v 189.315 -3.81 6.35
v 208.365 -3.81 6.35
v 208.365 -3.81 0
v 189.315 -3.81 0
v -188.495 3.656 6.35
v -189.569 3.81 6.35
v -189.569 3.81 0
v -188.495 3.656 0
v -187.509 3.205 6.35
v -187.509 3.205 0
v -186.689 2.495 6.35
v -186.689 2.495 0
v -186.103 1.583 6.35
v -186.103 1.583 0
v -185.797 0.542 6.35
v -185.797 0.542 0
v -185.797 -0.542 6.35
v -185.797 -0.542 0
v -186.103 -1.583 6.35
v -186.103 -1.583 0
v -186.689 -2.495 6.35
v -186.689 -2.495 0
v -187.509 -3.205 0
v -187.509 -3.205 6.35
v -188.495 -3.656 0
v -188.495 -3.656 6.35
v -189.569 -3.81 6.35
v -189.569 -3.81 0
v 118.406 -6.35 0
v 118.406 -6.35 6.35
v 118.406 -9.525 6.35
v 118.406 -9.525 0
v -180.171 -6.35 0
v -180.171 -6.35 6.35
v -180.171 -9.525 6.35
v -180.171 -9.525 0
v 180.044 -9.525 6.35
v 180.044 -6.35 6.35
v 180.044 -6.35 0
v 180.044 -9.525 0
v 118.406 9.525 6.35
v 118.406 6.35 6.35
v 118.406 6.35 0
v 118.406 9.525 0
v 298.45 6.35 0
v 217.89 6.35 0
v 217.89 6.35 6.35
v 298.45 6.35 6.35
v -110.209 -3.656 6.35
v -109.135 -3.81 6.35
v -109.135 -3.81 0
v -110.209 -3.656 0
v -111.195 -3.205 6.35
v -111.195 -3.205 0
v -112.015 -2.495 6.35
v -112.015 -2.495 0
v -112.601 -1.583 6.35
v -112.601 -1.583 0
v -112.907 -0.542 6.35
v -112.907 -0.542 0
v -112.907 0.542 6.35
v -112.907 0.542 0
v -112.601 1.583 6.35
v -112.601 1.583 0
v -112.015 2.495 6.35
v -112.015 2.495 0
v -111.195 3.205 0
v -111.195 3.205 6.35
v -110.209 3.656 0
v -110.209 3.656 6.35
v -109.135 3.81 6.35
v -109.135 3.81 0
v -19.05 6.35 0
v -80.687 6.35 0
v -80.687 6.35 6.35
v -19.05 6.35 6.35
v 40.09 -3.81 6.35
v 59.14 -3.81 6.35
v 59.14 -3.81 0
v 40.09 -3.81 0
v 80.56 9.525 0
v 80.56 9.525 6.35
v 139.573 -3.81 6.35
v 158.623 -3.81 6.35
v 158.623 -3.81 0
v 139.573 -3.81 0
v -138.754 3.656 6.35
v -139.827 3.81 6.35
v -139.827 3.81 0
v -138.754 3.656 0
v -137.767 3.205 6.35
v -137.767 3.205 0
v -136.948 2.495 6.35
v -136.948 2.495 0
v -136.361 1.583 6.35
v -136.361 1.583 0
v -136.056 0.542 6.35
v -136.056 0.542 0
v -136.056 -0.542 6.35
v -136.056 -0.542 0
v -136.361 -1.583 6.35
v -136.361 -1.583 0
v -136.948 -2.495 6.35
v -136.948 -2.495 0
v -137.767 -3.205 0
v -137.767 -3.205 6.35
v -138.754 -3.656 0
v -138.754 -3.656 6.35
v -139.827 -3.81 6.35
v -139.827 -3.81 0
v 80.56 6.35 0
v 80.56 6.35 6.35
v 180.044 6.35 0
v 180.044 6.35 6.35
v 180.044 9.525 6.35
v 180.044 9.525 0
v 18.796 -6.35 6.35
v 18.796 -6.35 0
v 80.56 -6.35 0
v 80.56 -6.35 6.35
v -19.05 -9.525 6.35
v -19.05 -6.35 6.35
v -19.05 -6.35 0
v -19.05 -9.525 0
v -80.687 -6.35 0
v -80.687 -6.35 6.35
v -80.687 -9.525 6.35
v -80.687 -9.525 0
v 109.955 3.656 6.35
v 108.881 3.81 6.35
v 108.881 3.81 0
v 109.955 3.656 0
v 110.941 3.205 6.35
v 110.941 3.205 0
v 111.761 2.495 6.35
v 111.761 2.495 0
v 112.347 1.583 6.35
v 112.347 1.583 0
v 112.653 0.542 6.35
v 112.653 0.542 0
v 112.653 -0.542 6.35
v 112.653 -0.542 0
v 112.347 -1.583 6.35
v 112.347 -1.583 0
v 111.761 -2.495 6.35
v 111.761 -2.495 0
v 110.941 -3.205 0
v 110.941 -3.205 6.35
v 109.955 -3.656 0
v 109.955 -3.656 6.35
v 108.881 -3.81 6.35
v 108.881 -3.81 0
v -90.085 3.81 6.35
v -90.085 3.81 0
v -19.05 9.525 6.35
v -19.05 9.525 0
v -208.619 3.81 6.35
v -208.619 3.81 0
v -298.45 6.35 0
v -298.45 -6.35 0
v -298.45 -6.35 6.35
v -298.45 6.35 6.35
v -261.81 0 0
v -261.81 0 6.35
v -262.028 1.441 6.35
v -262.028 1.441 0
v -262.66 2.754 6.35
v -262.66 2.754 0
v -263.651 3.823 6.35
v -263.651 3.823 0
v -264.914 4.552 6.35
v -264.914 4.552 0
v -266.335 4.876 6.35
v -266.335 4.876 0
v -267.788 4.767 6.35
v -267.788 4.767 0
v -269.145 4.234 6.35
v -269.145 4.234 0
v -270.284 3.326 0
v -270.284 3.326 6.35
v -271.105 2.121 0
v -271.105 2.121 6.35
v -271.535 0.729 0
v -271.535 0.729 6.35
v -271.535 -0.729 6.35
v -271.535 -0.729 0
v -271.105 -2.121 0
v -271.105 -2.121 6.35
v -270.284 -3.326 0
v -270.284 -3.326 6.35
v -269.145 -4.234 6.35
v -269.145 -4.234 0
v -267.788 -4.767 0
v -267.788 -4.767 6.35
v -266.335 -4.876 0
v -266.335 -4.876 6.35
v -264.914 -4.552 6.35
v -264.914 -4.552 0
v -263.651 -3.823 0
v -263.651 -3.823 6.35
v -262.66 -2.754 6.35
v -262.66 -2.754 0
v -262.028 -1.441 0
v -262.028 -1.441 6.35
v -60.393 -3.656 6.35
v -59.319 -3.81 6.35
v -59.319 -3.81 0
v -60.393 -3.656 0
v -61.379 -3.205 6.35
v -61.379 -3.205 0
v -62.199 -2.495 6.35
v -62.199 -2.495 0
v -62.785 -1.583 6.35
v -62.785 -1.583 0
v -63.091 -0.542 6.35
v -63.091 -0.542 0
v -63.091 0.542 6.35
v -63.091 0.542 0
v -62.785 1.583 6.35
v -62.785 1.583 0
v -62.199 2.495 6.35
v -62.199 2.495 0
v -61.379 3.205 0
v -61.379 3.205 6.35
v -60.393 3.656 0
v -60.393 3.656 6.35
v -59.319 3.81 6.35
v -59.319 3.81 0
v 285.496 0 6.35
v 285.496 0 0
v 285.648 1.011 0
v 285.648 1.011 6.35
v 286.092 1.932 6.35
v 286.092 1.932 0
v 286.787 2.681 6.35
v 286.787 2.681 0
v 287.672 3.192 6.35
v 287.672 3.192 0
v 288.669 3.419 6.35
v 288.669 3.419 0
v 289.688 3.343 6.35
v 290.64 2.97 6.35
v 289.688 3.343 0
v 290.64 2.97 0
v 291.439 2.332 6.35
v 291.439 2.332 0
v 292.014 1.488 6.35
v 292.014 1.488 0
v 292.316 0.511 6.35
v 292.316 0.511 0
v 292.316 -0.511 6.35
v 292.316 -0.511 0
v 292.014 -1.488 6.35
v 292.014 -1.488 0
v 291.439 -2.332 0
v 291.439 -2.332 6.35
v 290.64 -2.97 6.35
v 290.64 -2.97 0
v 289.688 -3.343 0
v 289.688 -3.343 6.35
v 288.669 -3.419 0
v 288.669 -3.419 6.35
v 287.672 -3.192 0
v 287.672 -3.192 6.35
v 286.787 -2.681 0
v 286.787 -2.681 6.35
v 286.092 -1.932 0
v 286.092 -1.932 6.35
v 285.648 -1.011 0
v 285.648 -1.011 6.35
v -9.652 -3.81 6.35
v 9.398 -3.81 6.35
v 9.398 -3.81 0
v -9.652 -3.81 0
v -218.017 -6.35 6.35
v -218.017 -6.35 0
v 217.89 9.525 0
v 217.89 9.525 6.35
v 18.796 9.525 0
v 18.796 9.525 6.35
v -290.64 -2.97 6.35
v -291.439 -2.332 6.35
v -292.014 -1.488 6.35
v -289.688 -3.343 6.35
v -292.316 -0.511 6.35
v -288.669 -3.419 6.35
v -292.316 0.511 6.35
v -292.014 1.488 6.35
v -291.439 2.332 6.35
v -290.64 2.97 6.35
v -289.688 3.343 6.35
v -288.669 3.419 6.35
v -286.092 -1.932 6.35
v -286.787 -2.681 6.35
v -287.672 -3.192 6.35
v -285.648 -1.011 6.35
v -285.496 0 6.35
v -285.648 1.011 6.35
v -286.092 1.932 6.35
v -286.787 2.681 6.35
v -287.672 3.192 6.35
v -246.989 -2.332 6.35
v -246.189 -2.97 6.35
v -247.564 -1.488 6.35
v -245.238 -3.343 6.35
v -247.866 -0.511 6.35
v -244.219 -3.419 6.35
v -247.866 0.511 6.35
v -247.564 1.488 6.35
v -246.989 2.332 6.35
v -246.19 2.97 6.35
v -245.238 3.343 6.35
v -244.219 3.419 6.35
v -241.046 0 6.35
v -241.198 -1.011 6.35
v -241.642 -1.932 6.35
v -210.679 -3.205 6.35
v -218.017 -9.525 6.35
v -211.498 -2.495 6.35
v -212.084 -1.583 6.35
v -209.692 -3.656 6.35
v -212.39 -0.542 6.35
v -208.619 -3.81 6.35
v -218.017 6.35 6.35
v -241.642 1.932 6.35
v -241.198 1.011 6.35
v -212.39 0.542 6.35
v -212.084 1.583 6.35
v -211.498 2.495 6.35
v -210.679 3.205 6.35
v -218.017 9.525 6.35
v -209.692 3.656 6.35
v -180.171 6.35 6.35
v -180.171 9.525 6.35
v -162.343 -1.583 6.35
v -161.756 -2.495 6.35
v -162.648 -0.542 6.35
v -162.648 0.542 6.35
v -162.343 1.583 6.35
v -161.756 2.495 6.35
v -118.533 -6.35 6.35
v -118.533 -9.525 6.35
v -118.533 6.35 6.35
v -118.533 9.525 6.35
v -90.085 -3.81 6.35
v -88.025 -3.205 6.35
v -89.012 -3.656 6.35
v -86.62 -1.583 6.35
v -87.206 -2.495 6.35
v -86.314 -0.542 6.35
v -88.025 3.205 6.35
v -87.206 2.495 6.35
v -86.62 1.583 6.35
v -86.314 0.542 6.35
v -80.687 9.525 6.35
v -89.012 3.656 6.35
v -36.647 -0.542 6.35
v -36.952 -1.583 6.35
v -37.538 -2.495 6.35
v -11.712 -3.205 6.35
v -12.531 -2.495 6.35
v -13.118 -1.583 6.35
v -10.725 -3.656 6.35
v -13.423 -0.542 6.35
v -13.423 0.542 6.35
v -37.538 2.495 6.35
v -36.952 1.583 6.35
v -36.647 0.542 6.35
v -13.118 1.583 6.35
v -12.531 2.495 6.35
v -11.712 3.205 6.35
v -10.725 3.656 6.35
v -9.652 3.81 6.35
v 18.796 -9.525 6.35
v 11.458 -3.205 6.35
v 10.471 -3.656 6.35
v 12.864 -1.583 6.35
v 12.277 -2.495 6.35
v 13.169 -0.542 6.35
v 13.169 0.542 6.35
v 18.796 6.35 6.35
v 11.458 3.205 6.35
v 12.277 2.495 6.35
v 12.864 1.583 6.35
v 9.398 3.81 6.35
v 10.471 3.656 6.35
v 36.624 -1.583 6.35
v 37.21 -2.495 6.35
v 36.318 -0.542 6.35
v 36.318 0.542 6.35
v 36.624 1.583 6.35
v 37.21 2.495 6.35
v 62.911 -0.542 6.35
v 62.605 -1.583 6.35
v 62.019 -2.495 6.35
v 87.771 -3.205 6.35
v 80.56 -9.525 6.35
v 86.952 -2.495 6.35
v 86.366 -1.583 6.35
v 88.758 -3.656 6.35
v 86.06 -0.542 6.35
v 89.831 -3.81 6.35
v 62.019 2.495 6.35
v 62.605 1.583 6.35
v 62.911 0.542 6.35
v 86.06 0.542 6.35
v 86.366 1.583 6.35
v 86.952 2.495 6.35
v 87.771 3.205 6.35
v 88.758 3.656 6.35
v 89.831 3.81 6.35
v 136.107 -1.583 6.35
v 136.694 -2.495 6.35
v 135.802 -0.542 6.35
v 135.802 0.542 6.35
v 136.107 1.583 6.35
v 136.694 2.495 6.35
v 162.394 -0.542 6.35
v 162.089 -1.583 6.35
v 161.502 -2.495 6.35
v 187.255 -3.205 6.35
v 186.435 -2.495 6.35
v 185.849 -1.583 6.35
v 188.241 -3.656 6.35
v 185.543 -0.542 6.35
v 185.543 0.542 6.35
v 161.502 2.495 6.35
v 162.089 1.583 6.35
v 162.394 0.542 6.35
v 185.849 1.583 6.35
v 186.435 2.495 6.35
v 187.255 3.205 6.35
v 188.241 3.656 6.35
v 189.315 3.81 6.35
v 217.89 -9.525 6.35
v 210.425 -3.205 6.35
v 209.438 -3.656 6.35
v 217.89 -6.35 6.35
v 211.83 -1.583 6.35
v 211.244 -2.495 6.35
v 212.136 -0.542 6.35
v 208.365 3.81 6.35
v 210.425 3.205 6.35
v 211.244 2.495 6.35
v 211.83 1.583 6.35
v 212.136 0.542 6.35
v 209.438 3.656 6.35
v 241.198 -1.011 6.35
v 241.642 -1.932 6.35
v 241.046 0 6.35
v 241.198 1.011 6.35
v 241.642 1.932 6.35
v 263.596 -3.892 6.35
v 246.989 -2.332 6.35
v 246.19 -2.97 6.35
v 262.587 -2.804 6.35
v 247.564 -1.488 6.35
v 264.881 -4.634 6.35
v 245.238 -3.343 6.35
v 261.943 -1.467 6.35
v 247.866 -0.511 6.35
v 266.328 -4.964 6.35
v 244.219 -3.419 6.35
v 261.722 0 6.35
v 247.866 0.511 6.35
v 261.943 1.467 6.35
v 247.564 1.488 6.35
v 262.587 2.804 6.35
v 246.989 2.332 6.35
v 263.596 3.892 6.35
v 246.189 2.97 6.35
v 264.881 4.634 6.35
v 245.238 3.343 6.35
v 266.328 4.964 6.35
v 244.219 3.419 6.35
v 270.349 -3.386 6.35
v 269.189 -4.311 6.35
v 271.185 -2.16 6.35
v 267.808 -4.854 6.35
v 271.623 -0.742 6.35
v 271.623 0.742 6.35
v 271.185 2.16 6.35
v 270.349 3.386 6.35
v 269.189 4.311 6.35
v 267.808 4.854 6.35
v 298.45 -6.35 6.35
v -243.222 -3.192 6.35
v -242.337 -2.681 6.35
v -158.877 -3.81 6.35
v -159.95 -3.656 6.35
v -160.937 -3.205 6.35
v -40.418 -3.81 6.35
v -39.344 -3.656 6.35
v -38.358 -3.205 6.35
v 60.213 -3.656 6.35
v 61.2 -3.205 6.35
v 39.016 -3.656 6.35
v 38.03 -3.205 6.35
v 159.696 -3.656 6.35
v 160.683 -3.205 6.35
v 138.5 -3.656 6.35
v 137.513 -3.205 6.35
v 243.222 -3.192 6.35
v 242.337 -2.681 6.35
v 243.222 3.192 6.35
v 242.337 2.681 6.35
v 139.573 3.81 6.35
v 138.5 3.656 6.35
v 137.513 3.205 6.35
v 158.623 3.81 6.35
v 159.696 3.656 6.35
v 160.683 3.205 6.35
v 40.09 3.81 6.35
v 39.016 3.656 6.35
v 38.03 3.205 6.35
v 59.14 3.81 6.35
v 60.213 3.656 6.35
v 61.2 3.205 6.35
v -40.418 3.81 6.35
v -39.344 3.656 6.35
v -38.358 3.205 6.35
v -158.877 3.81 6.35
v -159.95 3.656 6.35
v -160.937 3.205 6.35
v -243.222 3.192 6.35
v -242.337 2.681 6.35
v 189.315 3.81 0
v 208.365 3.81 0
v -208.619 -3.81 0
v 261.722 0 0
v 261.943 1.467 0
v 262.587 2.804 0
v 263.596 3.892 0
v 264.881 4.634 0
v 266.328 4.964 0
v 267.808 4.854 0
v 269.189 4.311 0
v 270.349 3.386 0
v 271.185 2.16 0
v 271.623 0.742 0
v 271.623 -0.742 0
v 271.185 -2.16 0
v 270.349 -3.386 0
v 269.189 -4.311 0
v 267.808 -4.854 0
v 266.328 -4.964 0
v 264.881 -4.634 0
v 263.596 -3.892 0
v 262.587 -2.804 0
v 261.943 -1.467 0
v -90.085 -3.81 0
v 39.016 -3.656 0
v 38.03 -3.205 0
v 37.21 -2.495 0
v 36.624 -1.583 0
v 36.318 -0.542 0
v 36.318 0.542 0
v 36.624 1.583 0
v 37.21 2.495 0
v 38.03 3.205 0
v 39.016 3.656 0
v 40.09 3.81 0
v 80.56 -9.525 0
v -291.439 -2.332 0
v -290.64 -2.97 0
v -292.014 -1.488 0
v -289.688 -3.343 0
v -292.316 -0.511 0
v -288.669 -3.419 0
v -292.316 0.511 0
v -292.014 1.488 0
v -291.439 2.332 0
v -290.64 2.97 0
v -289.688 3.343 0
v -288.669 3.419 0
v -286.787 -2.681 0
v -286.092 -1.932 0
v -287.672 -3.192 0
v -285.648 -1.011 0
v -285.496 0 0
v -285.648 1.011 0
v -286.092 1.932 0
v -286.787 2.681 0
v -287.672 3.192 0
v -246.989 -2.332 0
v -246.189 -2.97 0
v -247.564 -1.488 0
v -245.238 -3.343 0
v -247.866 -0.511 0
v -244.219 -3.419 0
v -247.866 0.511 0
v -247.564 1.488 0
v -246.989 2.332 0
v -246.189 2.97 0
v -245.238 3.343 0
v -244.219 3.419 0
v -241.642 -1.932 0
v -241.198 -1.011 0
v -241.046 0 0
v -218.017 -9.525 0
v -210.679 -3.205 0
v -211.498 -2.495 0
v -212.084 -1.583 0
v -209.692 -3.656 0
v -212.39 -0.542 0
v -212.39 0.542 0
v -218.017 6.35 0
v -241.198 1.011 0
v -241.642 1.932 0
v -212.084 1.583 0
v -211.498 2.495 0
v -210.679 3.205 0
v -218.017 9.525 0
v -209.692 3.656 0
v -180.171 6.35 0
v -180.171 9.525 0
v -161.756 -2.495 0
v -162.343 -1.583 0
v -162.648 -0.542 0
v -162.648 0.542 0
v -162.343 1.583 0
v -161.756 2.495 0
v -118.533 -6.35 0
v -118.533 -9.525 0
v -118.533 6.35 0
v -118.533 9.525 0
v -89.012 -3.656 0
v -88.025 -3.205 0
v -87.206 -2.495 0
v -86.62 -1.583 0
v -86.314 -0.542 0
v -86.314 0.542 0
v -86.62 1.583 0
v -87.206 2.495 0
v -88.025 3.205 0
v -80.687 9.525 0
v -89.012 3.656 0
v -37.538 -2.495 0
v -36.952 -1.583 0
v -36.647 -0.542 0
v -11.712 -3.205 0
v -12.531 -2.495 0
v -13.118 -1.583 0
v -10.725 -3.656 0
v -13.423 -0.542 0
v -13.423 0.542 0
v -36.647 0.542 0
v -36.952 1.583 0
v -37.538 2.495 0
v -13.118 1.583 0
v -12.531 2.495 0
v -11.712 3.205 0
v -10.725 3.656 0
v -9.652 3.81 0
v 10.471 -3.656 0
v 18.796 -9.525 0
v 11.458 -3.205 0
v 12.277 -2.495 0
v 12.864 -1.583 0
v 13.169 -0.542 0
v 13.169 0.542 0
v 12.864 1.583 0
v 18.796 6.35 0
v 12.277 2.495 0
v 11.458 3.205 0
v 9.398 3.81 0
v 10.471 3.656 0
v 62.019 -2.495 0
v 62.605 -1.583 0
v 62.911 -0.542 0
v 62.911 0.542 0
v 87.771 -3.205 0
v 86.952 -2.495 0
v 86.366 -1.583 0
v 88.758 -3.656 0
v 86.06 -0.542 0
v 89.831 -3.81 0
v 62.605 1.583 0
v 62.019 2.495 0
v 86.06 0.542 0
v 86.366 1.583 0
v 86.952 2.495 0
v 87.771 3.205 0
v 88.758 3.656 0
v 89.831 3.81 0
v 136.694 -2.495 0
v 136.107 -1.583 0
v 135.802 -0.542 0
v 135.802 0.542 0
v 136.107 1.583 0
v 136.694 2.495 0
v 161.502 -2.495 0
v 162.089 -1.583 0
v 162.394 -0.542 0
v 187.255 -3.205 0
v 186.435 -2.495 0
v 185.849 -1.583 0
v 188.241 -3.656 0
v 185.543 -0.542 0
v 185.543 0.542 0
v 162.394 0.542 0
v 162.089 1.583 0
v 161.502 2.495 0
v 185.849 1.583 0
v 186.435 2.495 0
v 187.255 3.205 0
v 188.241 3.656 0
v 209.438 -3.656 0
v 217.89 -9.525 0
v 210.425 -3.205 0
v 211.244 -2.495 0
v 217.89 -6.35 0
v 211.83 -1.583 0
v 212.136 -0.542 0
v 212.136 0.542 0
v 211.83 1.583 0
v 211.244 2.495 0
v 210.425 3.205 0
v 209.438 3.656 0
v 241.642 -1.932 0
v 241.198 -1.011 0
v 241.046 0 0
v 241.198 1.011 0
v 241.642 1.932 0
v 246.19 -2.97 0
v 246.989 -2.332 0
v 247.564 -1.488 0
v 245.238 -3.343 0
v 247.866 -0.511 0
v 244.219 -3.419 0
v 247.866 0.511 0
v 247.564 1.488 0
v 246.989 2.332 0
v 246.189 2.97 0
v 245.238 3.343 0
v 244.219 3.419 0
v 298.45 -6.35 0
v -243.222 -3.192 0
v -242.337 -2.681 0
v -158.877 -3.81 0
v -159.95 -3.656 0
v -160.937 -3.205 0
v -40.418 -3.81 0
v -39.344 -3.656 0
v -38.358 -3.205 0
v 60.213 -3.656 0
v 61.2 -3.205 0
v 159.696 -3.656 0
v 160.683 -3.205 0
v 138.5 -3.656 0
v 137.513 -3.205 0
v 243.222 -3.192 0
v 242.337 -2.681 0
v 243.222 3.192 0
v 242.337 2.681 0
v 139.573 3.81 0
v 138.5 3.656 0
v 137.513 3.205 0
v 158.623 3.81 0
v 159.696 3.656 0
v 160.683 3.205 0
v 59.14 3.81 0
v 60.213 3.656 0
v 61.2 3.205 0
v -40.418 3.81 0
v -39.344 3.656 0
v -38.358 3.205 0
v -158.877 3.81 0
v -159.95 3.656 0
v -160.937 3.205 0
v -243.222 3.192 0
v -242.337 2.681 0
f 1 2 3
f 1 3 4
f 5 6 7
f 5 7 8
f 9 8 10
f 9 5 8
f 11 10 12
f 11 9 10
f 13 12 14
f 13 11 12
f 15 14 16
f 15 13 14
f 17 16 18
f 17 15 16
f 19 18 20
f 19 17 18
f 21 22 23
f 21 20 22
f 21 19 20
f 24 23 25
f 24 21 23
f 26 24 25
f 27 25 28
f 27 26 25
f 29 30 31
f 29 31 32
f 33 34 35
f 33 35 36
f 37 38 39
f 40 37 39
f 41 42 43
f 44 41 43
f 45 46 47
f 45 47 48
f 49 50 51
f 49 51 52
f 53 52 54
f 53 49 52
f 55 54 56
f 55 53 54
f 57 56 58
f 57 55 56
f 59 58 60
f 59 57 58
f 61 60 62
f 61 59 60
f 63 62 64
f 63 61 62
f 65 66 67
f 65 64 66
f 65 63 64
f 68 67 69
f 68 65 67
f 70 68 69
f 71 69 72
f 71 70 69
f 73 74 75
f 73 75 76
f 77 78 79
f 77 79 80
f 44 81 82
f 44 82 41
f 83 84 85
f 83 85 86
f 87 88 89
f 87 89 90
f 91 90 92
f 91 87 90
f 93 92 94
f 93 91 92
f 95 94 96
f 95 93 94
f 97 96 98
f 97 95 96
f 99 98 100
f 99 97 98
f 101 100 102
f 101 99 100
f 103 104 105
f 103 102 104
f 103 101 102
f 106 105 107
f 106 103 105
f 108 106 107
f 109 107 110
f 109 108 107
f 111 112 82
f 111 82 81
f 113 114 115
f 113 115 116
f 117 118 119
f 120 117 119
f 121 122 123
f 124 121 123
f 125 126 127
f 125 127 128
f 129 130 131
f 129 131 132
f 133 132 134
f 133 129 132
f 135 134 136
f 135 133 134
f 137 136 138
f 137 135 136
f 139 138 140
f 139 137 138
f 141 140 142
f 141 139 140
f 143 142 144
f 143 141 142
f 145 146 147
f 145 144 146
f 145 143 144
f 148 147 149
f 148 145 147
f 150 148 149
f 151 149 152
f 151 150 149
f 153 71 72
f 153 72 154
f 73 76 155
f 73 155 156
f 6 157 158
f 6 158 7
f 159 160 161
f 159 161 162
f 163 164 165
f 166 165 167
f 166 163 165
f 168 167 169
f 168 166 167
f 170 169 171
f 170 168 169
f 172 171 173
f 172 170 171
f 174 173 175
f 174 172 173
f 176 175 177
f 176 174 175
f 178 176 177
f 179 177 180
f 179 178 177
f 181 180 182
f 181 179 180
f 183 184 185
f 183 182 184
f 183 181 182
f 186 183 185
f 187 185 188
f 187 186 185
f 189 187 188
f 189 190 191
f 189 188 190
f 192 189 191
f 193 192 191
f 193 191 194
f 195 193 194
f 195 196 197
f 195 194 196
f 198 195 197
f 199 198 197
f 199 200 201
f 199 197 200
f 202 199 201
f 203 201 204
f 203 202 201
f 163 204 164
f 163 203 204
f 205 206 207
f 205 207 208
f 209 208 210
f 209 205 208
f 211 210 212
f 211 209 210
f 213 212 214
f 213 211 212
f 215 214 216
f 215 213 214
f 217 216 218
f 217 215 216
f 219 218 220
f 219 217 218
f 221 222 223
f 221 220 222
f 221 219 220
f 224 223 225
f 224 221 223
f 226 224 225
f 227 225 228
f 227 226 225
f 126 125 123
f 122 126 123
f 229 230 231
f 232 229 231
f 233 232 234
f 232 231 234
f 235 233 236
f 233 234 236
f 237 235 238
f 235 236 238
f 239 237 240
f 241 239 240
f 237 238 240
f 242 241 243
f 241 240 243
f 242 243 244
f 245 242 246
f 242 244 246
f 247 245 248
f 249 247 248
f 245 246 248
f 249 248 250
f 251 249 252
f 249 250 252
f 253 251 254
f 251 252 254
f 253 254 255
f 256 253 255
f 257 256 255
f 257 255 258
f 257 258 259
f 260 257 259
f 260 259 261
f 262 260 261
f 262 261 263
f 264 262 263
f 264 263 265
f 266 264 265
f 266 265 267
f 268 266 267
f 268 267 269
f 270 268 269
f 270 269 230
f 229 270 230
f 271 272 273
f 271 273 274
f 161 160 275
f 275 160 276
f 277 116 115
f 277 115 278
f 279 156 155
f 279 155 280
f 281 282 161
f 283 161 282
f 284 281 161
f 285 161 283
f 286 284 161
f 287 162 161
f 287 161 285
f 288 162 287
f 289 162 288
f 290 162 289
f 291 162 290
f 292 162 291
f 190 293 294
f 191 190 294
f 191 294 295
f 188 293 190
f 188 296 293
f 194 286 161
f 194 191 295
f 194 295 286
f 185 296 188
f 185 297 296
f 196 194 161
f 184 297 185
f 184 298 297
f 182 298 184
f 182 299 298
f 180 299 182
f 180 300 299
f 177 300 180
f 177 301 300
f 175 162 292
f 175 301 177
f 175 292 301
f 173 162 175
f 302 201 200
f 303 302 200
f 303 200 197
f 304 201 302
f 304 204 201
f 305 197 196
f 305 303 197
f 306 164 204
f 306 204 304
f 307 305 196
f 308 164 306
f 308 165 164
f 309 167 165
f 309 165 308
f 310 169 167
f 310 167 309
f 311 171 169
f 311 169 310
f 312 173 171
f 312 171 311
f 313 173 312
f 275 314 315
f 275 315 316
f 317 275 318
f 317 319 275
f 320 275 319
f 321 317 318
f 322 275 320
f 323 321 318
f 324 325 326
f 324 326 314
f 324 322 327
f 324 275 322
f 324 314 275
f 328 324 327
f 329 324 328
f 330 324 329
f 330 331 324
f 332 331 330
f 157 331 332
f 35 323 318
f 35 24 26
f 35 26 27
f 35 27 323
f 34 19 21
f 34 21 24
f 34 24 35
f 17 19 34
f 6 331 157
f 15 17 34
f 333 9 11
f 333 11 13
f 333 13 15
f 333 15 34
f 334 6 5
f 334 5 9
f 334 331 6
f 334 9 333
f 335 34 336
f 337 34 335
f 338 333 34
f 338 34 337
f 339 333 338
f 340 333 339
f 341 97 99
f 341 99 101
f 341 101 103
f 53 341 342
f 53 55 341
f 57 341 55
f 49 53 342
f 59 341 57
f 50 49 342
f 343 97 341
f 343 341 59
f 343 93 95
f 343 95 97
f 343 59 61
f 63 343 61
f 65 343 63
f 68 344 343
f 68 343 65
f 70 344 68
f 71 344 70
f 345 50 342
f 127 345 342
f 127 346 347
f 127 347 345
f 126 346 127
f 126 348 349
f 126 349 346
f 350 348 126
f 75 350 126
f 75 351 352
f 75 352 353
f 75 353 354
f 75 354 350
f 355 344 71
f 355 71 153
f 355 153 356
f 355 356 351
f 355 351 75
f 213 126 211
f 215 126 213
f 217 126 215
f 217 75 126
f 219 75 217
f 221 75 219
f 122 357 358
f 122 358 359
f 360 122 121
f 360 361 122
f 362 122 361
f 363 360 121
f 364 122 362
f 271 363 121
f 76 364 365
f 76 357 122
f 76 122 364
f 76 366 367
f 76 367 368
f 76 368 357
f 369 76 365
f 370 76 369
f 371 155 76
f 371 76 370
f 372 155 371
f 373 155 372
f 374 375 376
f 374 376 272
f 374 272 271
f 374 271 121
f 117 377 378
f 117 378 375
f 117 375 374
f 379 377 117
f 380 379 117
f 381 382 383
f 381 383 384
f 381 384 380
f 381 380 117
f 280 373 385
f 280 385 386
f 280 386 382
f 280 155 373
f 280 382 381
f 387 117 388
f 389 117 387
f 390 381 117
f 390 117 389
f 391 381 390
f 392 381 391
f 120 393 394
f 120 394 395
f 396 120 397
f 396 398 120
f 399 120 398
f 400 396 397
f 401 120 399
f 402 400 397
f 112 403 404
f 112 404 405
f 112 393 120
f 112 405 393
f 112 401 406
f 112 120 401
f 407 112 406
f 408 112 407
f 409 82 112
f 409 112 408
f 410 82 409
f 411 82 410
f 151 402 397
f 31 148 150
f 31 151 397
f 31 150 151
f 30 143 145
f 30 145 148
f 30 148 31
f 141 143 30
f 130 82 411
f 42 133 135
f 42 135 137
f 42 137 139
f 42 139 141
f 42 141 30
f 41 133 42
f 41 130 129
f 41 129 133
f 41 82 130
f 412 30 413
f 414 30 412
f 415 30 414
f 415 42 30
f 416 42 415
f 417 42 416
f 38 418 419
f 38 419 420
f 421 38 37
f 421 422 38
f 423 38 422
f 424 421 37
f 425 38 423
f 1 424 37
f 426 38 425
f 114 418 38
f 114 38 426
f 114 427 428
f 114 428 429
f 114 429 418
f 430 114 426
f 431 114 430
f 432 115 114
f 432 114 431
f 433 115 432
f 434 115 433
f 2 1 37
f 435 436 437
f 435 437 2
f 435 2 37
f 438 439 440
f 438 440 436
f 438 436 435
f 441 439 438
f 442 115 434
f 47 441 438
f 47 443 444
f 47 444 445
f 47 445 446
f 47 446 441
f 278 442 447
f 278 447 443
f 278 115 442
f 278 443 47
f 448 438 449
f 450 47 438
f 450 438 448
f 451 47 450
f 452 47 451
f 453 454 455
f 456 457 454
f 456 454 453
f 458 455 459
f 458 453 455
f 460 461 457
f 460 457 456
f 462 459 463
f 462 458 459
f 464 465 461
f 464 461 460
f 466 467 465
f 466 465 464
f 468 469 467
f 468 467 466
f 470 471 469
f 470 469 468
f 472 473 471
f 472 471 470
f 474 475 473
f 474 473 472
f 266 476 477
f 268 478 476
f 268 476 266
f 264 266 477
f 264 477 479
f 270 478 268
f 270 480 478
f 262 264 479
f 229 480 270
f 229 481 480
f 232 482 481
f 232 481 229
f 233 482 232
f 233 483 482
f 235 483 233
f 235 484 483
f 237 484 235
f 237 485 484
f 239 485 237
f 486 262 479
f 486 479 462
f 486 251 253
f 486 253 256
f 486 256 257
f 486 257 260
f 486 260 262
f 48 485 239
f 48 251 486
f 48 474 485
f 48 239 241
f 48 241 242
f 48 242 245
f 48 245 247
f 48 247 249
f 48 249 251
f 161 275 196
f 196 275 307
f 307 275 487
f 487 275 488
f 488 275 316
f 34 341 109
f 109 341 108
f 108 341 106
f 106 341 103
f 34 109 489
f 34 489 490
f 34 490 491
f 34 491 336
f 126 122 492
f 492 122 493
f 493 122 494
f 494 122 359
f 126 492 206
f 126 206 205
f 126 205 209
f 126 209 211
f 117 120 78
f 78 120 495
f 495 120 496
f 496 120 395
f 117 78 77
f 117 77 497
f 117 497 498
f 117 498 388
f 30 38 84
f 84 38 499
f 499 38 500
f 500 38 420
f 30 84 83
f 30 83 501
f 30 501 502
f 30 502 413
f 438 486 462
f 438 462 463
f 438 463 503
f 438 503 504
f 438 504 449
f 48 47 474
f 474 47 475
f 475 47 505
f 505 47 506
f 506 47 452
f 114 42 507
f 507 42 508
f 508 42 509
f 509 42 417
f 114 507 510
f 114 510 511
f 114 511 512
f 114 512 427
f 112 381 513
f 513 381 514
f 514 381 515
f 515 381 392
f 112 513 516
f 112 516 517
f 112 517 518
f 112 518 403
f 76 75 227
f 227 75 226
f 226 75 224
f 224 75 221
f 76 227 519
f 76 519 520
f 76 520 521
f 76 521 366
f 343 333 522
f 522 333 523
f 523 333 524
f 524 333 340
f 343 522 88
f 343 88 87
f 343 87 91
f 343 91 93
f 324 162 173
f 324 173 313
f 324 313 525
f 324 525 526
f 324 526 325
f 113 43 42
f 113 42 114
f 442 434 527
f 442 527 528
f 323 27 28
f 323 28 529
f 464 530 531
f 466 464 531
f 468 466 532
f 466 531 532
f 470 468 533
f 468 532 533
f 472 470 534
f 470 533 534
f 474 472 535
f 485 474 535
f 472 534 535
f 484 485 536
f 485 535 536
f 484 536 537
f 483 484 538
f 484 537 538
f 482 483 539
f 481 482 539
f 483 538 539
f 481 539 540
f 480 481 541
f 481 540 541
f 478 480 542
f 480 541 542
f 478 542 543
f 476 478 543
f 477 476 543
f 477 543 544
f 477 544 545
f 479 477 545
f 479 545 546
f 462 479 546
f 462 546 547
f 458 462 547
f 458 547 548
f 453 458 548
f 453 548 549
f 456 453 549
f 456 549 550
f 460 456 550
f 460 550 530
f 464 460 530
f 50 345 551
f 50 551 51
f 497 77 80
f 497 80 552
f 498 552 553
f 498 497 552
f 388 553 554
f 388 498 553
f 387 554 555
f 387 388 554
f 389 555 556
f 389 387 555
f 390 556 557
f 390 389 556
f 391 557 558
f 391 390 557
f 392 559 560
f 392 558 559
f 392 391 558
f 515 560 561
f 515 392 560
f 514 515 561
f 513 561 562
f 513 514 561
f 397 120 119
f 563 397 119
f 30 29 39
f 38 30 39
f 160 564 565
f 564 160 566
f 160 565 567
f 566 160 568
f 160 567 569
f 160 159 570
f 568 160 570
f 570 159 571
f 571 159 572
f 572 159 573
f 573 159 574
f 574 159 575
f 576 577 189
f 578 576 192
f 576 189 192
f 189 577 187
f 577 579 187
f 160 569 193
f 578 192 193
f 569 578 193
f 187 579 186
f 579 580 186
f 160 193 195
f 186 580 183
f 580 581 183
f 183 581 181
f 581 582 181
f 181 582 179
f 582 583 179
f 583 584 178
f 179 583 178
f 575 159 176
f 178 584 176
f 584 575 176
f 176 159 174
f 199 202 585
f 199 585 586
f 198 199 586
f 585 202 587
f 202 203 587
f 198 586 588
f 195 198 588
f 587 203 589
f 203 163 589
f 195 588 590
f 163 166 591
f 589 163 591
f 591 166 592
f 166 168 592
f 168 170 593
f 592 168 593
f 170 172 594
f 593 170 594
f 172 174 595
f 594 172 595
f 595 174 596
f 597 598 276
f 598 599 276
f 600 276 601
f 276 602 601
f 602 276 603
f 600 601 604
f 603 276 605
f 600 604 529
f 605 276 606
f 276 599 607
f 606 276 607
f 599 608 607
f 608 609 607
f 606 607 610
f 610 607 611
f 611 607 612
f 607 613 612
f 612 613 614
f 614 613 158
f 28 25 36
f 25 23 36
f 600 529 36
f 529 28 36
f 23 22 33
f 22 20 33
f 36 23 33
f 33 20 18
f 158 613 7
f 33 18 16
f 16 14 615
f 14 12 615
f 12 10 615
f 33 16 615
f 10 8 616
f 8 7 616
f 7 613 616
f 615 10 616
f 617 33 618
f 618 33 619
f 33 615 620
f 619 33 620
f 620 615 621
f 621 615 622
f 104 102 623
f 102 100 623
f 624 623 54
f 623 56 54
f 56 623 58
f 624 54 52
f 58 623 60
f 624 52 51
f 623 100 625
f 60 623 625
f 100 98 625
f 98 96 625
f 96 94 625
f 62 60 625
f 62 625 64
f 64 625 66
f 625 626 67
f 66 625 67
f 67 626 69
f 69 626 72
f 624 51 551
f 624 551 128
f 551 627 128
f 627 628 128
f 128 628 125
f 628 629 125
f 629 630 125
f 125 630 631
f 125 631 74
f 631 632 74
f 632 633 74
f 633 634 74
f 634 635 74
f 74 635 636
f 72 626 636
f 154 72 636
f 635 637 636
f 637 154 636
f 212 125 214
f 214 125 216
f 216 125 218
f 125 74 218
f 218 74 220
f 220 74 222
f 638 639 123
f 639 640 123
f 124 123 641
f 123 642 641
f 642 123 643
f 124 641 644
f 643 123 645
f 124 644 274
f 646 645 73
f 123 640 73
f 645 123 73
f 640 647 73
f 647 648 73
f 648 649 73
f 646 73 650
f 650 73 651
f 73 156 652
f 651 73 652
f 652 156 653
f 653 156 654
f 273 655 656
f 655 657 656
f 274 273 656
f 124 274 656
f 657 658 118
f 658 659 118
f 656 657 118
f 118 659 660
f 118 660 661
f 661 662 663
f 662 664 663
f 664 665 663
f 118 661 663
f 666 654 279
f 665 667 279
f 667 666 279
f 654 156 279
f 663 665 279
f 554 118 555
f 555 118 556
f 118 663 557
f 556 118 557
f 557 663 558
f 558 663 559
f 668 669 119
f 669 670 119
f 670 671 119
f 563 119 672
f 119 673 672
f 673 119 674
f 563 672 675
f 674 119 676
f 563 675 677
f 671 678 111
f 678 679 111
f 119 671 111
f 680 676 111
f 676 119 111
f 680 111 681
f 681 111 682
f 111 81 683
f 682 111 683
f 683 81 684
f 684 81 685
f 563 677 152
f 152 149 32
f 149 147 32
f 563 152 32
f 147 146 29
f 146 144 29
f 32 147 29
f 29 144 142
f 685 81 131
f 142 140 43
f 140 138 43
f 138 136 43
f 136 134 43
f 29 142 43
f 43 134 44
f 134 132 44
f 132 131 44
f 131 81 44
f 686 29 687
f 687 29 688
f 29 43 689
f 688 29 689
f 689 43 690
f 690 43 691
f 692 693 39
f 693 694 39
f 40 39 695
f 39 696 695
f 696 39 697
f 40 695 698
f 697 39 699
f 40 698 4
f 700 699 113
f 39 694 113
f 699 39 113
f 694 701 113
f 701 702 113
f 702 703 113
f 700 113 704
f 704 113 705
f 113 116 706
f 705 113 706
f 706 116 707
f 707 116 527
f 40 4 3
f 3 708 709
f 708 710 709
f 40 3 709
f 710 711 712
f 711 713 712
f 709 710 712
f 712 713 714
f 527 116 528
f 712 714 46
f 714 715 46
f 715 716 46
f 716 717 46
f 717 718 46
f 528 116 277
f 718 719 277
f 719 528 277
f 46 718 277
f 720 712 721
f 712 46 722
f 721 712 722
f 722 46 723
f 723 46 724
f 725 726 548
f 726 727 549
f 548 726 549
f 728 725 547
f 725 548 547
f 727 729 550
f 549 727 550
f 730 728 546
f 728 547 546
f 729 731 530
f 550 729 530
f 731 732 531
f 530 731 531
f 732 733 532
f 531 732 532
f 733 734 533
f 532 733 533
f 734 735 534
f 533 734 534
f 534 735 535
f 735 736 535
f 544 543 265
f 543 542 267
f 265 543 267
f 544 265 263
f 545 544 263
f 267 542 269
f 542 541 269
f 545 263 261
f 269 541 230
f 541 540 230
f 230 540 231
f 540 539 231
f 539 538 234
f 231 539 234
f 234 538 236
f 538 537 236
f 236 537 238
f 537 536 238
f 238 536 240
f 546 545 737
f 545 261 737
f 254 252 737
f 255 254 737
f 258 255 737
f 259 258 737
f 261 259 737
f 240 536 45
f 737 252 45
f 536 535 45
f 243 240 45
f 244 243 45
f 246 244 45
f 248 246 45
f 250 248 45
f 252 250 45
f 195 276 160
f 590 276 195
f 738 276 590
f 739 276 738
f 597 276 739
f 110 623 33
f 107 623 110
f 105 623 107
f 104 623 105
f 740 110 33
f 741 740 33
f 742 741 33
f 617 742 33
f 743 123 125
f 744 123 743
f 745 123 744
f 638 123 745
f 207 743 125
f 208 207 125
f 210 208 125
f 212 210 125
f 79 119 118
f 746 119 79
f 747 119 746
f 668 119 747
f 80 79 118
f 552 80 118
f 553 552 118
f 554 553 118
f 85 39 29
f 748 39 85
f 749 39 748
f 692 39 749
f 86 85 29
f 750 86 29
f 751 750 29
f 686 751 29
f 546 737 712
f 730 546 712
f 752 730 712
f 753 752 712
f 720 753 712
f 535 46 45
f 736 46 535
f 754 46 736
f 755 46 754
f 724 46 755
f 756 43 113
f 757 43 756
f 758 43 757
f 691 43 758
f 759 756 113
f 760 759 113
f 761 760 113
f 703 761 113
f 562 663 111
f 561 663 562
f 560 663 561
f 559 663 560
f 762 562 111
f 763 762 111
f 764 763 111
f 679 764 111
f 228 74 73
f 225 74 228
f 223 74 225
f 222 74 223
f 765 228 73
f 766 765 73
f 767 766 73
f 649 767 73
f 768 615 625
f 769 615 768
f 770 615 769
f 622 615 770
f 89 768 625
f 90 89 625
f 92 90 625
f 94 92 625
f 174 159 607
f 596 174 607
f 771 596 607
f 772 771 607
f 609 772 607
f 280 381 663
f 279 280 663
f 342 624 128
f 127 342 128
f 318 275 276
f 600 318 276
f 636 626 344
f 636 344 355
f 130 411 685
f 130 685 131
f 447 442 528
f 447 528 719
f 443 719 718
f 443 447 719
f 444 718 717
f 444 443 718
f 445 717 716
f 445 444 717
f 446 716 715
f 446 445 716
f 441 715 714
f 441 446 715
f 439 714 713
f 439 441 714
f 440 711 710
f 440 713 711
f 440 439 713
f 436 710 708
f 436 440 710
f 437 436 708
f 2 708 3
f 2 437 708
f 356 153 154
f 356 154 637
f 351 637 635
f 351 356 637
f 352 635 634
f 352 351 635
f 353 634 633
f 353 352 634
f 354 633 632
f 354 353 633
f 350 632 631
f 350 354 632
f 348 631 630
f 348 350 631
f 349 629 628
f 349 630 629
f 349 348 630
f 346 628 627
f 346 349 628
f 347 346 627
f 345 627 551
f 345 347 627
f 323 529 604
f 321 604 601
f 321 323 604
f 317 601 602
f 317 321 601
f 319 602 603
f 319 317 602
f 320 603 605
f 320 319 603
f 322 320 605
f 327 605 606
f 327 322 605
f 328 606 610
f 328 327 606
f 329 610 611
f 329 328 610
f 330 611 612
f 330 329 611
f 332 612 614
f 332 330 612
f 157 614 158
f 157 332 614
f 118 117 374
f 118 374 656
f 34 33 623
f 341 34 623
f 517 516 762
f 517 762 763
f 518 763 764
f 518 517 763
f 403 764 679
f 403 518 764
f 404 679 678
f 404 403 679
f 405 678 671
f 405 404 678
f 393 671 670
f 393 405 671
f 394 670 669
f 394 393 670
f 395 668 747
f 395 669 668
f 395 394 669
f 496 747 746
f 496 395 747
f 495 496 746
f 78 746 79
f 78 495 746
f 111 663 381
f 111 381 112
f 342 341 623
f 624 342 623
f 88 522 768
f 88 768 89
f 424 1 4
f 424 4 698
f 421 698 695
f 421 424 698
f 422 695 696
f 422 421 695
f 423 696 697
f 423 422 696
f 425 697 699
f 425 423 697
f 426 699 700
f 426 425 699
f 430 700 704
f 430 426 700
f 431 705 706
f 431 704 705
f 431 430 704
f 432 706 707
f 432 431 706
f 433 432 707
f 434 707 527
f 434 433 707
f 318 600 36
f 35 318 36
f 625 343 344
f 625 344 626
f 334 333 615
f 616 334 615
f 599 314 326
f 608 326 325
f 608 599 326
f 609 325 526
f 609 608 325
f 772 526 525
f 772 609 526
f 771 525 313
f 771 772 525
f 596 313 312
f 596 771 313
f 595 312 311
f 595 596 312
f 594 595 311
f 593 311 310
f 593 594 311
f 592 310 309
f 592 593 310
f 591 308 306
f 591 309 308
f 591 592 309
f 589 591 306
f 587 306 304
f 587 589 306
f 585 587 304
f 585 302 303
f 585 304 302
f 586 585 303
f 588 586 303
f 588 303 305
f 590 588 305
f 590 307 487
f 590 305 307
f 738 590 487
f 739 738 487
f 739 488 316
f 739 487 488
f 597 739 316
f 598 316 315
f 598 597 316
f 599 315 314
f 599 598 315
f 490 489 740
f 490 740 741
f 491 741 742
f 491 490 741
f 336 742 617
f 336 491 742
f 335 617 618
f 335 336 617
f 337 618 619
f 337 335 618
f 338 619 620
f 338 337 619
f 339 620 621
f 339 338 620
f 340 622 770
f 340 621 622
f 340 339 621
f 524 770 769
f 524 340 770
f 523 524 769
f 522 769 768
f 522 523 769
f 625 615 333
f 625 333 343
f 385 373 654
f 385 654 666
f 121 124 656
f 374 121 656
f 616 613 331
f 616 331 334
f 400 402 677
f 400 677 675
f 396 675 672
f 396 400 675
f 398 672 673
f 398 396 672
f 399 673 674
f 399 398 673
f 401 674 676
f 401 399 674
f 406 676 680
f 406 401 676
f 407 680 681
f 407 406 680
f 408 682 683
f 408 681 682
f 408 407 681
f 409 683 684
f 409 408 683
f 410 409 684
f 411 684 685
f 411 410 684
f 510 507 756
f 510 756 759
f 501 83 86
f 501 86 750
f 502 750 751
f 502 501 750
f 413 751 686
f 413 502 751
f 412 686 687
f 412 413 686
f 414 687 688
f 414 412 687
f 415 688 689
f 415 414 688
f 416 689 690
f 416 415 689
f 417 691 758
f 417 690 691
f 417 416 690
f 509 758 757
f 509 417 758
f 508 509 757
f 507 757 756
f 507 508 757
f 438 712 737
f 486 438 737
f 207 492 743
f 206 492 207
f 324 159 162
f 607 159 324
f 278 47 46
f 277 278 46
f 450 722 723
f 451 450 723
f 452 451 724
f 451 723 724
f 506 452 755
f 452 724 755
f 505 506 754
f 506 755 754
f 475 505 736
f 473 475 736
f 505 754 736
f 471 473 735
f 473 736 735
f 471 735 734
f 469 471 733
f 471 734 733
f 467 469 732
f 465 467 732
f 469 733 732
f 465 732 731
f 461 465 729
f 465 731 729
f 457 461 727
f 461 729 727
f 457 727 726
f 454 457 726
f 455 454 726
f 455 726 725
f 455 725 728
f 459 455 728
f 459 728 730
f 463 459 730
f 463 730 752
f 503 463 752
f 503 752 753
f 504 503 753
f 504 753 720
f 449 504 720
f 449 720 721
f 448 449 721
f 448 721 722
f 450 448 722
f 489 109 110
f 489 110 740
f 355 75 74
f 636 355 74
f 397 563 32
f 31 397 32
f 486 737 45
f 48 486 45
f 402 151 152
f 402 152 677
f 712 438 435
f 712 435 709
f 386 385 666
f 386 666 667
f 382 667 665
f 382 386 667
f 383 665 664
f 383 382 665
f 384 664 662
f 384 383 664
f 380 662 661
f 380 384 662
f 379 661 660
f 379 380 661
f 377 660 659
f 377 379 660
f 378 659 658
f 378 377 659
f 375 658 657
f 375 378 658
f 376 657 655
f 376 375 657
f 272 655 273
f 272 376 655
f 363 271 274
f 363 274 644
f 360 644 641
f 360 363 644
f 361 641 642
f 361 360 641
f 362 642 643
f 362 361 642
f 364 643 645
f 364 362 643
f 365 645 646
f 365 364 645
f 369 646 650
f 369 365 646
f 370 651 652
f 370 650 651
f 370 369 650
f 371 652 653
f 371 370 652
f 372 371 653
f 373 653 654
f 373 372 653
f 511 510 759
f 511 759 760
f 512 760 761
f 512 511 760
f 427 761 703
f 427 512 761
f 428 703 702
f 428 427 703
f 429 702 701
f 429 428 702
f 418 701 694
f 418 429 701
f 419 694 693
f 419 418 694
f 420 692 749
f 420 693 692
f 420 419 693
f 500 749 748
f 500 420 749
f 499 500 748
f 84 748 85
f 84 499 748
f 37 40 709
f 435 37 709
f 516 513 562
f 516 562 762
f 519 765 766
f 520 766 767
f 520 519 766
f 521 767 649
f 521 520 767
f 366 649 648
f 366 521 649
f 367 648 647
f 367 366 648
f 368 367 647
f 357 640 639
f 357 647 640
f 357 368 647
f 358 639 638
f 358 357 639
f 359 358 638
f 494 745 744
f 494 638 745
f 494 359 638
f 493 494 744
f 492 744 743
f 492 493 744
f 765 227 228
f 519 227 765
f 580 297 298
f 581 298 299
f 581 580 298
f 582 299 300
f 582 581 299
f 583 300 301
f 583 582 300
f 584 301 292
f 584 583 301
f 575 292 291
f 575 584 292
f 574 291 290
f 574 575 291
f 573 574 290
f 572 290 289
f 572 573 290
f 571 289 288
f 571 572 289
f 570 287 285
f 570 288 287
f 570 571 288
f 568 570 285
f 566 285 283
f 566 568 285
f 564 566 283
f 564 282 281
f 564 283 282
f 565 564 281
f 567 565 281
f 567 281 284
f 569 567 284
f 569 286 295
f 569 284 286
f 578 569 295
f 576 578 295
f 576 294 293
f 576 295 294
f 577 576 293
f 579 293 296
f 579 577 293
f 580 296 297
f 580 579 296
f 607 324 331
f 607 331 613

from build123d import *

# Parameters (mm, degrees)
SKETCH1_W           = 596.9
SKETCH1_H           = 12.7
BOSS_EXTRUDE1_DEPTH = 6.35
SKETCH3_W           = 37.846
SKETCH3_H           = 6.35
BOSS_EXTRUDE2_DEPTH = 3.175
SKETCH4_R           = 3.429
SKETCH4_R_2         = 4.8895
CUT_EXTRUDE1_DEPTH  = 299.669467179
SKETCH5_R           = 4.9784
CUT_EXTRUDE2_DEPTH  = 299.669467179
CUT_EXTRUDE3_DEPTH  = 299.669467179


with BuildPart() as part:
    # Sketch1 → Boss-Extrude1 (new body)
    with BuildSketch(Plane.XY):
        Rectangle(SKETCH1_W, SKETCH1_H)
    extrude(amount=BOSS_EXTRUDE1_DEPTH)

    # Sketch3 → Boss-Extrude2 (add)
    with BuildSketch(Plane(origin=(0, 6.35, 0), x_dir=(1, 0, 0), z_dir=(0, 1, 0))):
        with Locations((-199.093666667, -3.175)):
            Rectangle(SKETCH3_W, SKETCH3_H)
        with Locations((-99.610333333, -3.175)):
            Rectangle(SKETCH3_W, SKETCH3_H)
        with Locations((-0.127, -3.175)):
            Rectangle(SKETCH3_W, SKETCH3_H)
        with Locations((99.483333333, -3.175)):
            Rectangle(SKETCH3_W, SKETCH3_H)
        with Locations((198.966666751, -3.175)):
            Rectangle(SKETCH3_W, SKETCH3_H)
    boss_extrude2 = extrude(amount=BOSS_EXTRUDE2_DEPTH)

    # Mirror1: Boss-Extrude2 across plane
    add(boss_extrude2.mirror(Plane.ZX))

    # Sketch4 → Cut-Extrude1 (cut, through all)
    with BuildSketch(Plane(origin=(0, 0, 0), x_dir=(-1, 0, 0), z_dir=(0, 0, -1))):
        with Locations((-288.925, 0)):
            Circle(SKETCH4_R)
        with Locations((-244.475, 0)):
            Circle(SKETCH4_R)
        with Locations((-266.7, 0)):
            Circle(SKETCH4_R_2)
    cut_extrude1 = extrude(amount=-CUT_EXTRUDE1_DEPTH, mode=Mode.SUBTRACT)

    # Mirror2: Cut-Extrude1 across plane
    add(cut_extrude1.mirror(Plane(origin=(0, 0, 0), x_dir=(0, 0, 1), z_dir=(1, 0, 0))), mode=Mode.SUBTRACT)

    # Sketch5 → Cut-Extrude2 (cut, through all)
    with BuildSketch(Plane(origin=(0, 0, 0), x_dir=(-1, 0, 0), z_dir=(0, 0, -1))):
        with Locations((-266.7, 0)):
            Circle(SKETCH5_R)
    extrude(amount=-CUT_EXTRUDE2_DEPTH, mode=Mode.SUBTRACT)

    # Sketch6 → Cut-Extrude3 (cut, through all)
    with BuildSketch(Plane.XY.offset(6.35)):
        with BuildLine():
            Line((-208.618666667, 3.81), (-189.568666667, 3.81))
            ThreePointArc((-189.568666667, 3.81), (-185.758666667, 0), (-189.568666667, -3.81))
            Line((-189.568666667, -3.81), (-208.618666667, -3.81))
            ThreePointArc((-208.618666667, -3.81), (-212.428666667, 0), (-208.618666667, 3.81))
        make_face()
        with BuildLine():
            Line((-109.135333333, 3.81), (-90.085333333, 3.81))
            ThreePointArc((-90.085333333, 3.81), (-86.275333333, 0), (-90.085333333, -3.81))
            Line((-90.085333333, -3.81), (-109.135333333, -3.81))
            ThreePointArc((-109.135333333, -3.81), (-112.945333333, 0), (-109.135333333, 3.81))
        make_face()
        with BuildLine():
            Line((-9.652, 3.81), (9.398, 3.81))
            ThreePointArc((9.398, 3.81), (13.208, 0), (9.398, -3.81))
            Line((9.398, -3.81), (-9.652, -3.81))
            ThreePointArc((-9.652, -3.81), (-13.462, 0), (-9.652, 3.81))
        make_face()
        with BuildLine():
            Line((89.831333333, 3.81), (108.881333333, 3.81))
            ThreePointArc((108.881333333, 3.81), (112.691333333, 0), (108.881333333, -3.81))
            Line((108.881333333, -3.81), (89.831333333, -3.81))
            ThreePointArc((89.831333333, -3.81), (86.021333333, 0), (89.831333333, 3.81))
        make_face()
        with BuildLine():
            Line((189.314666667, 3.81), (208.364666667, 3.81))
            ThreePointArc((208.364666667, 3.81), (212.174666667, 0), (208.364666667, -3.81))
            Line((208.364666667, -3.81), (189.314666667, -3.81))
            ThreePointArc((189.314666667, -3.81), (185.504666667, 0), (189.314666667, 3.81))
        make_face()
        with BuildLine():
            Line((-158.877, 3.81), (-139.827, 3.81))
            ThreePointArc((-139.827, 3.81), (-136.017, 0), (-139.827, -3.81))
            Line((-139.827, -3.81), (-158.877, -3.81))
            ThreePointArc((-158.877, -3.81), (-162.687, 0), (-158.877, 3.81))
        make_face()
        with BuildLine():
            Line((-59.319456458, 3.81), (-40.417876875, 3.81))
            ThreePointArc((-40.417876875, 3.81), (-36.607876875, 0), (-40.417876875, -3.81))
            Line((-40.417876875, -3.81), (-59.319456458, -3.81))
            ThreePointArc((-59.319456458, -3.81), (-63.129456458, 0), (-59.319456458, 3.81))
        make_face()
        with BuildLine():
            Line((40.089666667, 3.81), (59.139666667, 3.81))
            ThreePointArc((59.139666667, 3.81), (62.949666667, 0), (59.139666667, -3.81))
            Line((59.139666667, -3.81), (40.089666667, -3.81))
            ThreePointArc((40.089666667, -3.81), (36.279666667, 0), (40.089666667, 3.81))
        make_face()
        with BuildLine():
            Line((139.573, 3.81), (158.623, 3.81))
            ThreePointArc((158.623, 3.81), (162.433, 0), (158.623, -3.81))
            Line((158.623, -3.81), (139.573, -3.81))
            ThreePointArc((139.573, -3.81), (135.763, 0), (139.573, 3.81))
        make_face()
    extrude(amount=-CUT_EXTRUDE3_DEPTH, mode=Mode.SUBTRACT)


solid = part.part
